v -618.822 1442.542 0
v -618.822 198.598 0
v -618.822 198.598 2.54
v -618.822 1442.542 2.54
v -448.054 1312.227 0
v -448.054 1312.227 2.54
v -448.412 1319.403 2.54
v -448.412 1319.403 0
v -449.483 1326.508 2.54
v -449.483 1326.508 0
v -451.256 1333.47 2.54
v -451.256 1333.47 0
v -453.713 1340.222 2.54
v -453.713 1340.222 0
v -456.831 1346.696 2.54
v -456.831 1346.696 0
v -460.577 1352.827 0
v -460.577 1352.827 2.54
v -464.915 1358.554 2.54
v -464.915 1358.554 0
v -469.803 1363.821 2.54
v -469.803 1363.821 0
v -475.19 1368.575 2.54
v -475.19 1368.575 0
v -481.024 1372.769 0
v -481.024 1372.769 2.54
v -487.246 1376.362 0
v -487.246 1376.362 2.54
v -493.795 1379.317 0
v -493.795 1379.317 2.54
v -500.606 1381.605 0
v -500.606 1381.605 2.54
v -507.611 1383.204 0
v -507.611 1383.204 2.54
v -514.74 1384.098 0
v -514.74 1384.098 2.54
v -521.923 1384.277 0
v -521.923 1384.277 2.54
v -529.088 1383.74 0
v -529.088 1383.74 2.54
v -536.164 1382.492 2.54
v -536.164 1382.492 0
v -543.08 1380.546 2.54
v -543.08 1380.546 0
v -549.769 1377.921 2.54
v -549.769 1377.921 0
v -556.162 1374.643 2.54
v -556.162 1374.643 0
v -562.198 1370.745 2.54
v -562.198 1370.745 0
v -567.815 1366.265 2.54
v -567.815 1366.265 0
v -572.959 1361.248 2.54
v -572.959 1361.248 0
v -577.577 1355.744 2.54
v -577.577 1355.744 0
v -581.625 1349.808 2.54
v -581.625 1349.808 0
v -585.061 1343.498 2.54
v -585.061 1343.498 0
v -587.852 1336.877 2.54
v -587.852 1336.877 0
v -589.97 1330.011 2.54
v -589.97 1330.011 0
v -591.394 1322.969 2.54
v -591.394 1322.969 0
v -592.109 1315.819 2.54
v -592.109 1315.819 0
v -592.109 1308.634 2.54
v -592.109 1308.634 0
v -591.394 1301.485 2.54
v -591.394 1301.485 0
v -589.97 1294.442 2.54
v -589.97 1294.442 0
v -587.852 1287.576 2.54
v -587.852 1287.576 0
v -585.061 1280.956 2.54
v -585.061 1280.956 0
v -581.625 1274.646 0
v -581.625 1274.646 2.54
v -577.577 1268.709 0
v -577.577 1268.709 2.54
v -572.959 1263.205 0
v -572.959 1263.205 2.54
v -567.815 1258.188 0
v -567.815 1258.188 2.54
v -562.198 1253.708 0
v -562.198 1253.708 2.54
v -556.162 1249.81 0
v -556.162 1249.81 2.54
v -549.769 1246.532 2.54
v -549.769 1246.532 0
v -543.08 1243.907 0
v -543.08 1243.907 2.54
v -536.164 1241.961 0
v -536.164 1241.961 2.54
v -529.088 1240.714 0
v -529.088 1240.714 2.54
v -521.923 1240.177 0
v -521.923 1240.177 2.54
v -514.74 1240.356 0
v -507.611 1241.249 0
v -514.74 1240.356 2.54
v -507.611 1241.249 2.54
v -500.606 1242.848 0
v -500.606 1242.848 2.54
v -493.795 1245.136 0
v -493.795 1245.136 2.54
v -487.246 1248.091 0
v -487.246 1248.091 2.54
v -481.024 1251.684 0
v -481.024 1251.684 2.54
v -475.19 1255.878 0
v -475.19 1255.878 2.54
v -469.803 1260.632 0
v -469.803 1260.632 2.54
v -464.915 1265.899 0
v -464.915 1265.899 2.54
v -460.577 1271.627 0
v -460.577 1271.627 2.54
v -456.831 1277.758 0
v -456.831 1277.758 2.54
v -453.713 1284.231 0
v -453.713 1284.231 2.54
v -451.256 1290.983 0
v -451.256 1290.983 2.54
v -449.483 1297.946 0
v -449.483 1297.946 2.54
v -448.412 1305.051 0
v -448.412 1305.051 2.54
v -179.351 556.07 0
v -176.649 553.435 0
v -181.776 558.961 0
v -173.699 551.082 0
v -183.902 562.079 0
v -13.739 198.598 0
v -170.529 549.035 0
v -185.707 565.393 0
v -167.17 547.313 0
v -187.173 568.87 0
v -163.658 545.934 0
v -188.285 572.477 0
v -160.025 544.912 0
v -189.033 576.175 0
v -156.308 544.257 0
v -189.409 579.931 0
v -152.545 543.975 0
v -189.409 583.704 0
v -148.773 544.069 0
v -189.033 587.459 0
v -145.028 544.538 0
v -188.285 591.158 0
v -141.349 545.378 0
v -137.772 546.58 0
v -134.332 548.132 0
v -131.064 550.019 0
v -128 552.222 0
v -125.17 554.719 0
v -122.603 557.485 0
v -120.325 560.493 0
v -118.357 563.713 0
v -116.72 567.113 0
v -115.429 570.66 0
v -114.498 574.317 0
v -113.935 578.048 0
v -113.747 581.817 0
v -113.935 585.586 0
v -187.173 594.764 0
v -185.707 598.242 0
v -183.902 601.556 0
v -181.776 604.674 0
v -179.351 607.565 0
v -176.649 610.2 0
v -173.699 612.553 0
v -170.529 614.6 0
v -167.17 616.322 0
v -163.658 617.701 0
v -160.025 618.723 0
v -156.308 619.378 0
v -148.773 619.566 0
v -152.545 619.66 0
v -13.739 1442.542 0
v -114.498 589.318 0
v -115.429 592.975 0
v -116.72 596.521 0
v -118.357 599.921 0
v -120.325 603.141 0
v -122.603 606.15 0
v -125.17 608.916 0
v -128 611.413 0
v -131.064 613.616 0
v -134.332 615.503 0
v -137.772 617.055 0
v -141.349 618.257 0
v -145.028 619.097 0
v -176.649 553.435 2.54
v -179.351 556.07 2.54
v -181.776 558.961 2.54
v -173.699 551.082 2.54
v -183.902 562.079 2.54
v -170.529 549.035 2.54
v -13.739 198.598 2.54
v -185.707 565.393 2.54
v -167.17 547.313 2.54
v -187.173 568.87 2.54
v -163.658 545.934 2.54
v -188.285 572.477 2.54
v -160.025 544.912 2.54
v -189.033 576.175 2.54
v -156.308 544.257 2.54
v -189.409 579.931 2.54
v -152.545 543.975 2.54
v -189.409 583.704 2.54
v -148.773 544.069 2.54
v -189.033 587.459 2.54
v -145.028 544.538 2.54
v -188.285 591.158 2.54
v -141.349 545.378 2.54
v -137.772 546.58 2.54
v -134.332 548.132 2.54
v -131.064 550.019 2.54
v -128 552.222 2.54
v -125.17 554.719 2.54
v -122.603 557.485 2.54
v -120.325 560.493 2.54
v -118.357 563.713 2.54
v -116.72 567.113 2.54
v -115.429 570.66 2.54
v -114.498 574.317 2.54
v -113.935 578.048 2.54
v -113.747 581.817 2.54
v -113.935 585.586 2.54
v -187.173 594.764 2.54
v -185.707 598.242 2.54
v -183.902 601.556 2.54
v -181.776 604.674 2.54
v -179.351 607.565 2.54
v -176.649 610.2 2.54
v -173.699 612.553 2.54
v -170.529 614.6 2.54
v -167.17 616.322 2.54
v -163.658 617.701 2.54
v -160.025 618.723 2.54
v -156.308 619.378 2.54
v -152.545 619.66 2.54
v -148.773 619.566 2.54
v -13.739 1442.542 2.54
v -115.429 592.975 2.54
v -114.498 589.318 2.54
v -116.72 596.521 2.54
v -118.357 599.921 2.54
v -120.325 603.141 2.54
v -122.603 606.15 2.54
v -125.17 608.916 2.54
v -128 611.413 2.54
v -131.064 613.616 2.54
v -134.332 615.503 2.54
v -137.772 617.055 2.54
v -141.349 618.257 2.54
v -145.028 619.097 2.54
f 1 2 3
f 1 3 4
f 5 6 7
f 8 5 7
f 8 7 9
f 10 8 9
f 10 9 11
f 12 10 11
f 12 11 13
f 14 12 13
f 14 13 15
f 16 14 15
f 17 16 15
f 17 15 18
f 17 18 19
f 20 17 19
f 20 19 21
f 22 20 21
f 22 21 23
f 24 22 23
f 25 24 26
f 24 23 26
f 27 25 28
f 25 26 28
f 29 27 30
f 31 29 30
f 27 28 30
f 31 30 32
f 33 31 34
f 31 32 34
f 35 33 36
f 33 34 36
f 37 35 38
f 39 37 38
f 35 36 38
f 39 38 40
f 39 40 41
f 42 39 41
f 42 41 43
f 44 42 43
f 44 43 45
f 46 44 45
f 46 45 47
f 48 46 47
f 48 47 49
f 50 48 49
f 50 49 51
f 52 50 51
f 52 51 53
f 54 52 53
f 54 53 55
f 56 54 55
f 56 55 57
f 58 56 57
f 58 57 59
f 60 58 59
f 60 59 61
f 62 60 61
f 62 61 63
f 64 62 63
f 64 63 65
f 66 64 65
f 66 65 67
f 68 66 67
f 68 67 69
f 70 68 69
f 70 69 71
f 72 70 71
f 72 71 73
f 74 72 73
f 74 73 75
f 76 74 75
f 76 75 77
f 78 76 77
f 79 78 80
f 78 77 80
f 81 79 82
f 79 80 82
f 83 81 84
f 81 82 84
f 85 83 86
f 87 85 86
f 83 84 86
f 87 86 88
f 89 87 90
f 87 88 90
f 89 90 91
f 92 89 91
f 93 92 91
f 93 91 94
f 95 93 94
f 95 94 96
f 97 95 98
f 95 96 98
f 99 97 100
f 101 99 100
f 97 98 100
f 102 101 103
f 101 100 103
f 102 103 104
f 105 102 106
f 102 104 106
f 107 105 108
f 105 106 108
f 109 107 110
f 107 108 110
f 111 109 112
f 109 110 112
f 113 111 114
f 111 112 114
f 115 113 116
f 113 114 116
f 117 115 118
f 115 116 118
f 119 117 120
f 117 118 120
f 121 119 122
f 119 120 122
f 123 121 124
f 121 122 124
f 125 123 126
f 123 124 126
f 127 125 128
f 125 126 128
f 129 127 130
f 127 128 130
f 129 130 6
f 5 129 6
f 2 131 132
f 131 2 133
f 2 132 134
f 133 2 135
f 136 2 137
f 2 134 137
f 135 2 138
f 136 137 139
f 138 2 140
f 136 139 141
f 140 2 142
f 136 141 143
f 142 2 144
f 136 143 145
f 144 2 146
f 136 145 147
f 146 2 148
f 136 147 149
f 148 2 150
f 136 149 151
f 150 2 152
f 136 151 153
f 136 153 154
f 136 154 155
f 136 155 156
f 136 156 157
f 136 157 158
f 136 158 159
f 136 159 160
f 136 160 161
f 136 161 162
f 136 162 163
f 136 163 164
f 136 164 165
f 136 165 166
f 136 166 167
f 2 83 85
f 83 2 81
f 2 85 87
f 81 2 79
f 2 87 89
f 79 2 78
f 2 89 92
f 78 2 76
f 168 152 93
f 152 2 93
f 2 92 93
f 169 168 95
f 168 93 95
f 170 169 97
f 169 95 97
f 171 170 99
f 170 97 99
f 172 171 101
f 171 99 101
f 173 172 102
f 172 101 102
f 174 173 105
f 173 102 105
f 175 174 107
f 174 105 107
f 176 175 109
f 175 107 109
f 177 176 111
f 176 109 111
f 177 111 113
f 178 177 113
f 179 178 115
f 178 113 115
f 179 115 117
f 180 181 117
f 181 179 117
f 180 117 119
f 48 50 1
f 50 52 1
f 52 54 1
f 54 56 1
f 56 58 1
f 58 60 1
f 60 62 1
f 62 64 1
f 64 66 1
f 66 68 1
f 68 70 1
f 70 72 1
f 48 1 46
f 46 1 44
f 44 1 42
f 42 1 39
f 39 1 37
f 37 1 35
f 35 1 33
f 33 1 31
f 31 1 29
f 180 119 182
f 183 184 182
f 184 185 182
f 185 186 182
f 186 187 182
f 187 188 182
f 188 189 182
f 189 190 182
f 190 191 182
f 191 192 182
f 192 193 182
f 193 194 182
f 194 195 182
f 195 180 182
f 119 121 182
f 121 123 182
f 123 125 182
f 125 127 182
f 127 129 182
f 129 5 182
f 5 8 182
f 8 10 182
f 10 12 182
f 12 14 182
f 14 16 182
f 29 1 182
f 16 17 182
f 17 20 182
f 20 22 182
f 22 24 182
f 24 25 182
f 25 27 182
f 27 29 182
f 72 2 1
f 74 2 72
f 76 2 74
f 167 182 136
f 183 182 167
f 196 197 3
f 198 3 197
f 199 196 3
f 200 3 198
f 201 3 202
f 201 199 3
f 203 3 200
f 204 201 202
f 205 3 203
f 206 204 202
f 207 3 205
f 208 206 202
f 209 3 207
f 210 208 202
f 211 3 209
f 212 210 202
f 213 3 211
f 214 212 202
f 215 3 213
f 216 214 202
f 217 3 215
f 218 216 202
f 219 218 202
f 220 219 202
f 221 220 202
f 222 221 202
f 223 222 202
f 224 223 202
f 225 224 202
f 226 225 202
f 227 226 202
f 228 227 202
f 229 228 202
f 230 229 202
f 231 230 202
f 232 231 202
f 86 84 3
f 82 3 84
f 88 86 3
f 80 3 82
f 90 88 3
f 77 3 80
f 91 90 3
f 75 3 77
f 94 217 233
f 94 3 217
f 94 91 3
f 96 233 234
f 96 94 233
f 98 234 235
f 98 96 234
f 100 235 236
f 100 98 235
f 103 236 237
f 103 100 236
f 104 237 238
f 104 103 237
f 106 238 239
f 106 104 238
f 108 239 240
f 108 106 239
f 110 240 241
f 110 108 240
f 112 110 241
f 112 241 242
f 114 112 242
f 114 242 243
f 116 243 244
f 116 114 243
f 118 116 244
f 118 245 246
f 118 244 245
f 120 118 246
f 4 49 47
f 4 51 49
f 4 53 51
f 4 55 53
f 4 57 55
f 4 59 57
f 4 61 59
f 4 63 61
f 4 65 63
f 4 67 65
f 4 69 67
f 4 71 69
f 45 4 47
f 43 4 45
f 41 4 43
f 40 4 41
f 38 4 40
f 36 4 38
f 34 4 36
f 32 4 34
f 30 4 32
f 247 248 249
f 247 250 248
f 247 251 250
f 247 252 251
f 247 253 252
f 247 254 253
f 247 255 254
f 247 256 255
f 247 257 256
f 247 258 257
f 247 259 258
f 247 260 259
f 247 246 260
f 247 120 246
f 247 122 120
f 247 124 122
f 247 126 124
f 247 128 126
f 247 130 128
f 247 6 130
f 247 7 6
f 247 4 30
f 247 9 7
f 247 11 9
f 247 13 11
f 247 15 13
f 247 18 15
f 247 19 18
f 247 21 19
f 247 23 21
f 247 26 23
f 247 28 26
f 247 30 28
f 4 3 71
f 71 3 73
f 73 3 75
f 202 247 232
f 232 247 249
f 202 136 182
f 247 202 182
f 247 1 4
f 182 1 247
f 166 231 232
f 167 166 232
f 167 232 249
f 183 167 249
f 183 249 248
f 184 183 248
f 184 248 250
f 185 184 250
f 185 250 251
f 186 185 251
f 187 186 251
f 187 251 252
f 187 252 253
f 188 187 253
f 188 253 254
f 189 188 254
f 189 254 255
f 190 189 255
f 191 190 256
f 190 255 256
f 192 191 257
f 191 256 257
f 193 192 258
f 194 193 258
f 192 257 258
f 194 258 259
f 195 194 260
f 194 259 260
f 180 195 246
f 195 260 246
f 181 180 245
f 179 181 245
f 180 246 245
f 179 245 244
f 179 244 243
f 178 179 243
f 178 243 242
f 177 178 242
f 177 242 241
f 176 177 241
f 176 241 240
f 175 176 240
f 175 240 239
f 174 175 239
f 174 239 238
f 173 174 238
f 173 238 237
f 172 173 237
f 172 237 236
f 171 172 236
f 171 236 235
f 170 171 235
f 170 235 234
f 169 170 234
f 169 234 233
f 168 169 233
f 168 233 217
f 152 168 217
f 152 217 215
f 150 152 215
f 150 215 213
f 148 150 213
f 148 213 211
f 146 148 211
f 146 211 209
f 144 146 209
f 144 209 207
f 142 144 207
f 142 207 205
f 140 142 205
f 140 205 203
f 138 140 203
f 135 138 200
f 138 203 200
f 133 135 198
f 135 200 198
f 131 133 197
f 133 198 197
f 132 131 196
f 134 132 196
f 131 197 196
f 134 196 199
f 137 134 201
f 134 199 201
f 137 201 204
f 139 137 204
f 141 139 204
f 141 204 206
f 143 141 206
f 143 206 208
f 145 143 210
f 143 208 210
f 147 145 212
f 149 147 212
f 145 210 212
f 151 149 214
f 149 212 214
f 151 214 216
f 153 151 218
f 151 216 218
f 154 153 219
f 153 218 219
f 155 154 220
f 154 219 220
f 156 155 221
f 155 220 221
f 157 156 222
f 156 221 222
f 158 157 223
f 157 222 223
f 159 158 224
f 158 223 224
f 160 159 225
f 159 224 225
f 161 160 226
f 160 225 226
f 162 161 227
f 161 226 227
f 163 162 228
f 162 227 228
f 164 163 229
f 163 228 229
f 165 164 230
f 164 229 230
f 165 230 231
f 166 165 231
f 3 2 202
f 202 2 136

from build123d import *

# Parameters (mm, degrees)
SKETCH1_W               = 605.082945164
SKETCH1_H               = 1243.943840666
BOSS_EXTRUDE1_DEPTH     = 2.54
SKETCH3_R               = 72.07245037
SKETCH3_R_2             = 37.854305462
CUT_EXTRUDE1_DEPTH      = 1
CUT_EXTRUDE1_DEPTH_BACK = 3.54


with BuildPart() as part:
    # Sketch1 → Boss-Extrude1 (new body)
    with BuildSketch(Plane.XY):
        with Locations((-316.280332246, 820.569825563)):
            Rectangle(SKETCH1_W, SKETCH1_H)
    extrude(amount=BOSS_EXTRUDE1_DEPTH)

    # Sketch3 → Cut-Extrude1 (cut, two sides)
    with BuildSketch(Plane.XY.offset(2.54)) as cut_extrude1_sk:
        with Locations((-520.126168734, 1312.226670832)):
            Circle(SKETCH3_R)
        with Locations((-151.601482637, 581.817383071)):
            Circle(SKETCH3_R_2)
    extrude(amount=CUT_EXTRUDE1_DEPTH, mode=Mode.SUBTRACT)
    extrude(cut_extrude1_sk.sketch, amount=-CUT_EXTRUDE1_DEPTH_BACK, mode=Mode.SUBTRACT)


solid = part.part
